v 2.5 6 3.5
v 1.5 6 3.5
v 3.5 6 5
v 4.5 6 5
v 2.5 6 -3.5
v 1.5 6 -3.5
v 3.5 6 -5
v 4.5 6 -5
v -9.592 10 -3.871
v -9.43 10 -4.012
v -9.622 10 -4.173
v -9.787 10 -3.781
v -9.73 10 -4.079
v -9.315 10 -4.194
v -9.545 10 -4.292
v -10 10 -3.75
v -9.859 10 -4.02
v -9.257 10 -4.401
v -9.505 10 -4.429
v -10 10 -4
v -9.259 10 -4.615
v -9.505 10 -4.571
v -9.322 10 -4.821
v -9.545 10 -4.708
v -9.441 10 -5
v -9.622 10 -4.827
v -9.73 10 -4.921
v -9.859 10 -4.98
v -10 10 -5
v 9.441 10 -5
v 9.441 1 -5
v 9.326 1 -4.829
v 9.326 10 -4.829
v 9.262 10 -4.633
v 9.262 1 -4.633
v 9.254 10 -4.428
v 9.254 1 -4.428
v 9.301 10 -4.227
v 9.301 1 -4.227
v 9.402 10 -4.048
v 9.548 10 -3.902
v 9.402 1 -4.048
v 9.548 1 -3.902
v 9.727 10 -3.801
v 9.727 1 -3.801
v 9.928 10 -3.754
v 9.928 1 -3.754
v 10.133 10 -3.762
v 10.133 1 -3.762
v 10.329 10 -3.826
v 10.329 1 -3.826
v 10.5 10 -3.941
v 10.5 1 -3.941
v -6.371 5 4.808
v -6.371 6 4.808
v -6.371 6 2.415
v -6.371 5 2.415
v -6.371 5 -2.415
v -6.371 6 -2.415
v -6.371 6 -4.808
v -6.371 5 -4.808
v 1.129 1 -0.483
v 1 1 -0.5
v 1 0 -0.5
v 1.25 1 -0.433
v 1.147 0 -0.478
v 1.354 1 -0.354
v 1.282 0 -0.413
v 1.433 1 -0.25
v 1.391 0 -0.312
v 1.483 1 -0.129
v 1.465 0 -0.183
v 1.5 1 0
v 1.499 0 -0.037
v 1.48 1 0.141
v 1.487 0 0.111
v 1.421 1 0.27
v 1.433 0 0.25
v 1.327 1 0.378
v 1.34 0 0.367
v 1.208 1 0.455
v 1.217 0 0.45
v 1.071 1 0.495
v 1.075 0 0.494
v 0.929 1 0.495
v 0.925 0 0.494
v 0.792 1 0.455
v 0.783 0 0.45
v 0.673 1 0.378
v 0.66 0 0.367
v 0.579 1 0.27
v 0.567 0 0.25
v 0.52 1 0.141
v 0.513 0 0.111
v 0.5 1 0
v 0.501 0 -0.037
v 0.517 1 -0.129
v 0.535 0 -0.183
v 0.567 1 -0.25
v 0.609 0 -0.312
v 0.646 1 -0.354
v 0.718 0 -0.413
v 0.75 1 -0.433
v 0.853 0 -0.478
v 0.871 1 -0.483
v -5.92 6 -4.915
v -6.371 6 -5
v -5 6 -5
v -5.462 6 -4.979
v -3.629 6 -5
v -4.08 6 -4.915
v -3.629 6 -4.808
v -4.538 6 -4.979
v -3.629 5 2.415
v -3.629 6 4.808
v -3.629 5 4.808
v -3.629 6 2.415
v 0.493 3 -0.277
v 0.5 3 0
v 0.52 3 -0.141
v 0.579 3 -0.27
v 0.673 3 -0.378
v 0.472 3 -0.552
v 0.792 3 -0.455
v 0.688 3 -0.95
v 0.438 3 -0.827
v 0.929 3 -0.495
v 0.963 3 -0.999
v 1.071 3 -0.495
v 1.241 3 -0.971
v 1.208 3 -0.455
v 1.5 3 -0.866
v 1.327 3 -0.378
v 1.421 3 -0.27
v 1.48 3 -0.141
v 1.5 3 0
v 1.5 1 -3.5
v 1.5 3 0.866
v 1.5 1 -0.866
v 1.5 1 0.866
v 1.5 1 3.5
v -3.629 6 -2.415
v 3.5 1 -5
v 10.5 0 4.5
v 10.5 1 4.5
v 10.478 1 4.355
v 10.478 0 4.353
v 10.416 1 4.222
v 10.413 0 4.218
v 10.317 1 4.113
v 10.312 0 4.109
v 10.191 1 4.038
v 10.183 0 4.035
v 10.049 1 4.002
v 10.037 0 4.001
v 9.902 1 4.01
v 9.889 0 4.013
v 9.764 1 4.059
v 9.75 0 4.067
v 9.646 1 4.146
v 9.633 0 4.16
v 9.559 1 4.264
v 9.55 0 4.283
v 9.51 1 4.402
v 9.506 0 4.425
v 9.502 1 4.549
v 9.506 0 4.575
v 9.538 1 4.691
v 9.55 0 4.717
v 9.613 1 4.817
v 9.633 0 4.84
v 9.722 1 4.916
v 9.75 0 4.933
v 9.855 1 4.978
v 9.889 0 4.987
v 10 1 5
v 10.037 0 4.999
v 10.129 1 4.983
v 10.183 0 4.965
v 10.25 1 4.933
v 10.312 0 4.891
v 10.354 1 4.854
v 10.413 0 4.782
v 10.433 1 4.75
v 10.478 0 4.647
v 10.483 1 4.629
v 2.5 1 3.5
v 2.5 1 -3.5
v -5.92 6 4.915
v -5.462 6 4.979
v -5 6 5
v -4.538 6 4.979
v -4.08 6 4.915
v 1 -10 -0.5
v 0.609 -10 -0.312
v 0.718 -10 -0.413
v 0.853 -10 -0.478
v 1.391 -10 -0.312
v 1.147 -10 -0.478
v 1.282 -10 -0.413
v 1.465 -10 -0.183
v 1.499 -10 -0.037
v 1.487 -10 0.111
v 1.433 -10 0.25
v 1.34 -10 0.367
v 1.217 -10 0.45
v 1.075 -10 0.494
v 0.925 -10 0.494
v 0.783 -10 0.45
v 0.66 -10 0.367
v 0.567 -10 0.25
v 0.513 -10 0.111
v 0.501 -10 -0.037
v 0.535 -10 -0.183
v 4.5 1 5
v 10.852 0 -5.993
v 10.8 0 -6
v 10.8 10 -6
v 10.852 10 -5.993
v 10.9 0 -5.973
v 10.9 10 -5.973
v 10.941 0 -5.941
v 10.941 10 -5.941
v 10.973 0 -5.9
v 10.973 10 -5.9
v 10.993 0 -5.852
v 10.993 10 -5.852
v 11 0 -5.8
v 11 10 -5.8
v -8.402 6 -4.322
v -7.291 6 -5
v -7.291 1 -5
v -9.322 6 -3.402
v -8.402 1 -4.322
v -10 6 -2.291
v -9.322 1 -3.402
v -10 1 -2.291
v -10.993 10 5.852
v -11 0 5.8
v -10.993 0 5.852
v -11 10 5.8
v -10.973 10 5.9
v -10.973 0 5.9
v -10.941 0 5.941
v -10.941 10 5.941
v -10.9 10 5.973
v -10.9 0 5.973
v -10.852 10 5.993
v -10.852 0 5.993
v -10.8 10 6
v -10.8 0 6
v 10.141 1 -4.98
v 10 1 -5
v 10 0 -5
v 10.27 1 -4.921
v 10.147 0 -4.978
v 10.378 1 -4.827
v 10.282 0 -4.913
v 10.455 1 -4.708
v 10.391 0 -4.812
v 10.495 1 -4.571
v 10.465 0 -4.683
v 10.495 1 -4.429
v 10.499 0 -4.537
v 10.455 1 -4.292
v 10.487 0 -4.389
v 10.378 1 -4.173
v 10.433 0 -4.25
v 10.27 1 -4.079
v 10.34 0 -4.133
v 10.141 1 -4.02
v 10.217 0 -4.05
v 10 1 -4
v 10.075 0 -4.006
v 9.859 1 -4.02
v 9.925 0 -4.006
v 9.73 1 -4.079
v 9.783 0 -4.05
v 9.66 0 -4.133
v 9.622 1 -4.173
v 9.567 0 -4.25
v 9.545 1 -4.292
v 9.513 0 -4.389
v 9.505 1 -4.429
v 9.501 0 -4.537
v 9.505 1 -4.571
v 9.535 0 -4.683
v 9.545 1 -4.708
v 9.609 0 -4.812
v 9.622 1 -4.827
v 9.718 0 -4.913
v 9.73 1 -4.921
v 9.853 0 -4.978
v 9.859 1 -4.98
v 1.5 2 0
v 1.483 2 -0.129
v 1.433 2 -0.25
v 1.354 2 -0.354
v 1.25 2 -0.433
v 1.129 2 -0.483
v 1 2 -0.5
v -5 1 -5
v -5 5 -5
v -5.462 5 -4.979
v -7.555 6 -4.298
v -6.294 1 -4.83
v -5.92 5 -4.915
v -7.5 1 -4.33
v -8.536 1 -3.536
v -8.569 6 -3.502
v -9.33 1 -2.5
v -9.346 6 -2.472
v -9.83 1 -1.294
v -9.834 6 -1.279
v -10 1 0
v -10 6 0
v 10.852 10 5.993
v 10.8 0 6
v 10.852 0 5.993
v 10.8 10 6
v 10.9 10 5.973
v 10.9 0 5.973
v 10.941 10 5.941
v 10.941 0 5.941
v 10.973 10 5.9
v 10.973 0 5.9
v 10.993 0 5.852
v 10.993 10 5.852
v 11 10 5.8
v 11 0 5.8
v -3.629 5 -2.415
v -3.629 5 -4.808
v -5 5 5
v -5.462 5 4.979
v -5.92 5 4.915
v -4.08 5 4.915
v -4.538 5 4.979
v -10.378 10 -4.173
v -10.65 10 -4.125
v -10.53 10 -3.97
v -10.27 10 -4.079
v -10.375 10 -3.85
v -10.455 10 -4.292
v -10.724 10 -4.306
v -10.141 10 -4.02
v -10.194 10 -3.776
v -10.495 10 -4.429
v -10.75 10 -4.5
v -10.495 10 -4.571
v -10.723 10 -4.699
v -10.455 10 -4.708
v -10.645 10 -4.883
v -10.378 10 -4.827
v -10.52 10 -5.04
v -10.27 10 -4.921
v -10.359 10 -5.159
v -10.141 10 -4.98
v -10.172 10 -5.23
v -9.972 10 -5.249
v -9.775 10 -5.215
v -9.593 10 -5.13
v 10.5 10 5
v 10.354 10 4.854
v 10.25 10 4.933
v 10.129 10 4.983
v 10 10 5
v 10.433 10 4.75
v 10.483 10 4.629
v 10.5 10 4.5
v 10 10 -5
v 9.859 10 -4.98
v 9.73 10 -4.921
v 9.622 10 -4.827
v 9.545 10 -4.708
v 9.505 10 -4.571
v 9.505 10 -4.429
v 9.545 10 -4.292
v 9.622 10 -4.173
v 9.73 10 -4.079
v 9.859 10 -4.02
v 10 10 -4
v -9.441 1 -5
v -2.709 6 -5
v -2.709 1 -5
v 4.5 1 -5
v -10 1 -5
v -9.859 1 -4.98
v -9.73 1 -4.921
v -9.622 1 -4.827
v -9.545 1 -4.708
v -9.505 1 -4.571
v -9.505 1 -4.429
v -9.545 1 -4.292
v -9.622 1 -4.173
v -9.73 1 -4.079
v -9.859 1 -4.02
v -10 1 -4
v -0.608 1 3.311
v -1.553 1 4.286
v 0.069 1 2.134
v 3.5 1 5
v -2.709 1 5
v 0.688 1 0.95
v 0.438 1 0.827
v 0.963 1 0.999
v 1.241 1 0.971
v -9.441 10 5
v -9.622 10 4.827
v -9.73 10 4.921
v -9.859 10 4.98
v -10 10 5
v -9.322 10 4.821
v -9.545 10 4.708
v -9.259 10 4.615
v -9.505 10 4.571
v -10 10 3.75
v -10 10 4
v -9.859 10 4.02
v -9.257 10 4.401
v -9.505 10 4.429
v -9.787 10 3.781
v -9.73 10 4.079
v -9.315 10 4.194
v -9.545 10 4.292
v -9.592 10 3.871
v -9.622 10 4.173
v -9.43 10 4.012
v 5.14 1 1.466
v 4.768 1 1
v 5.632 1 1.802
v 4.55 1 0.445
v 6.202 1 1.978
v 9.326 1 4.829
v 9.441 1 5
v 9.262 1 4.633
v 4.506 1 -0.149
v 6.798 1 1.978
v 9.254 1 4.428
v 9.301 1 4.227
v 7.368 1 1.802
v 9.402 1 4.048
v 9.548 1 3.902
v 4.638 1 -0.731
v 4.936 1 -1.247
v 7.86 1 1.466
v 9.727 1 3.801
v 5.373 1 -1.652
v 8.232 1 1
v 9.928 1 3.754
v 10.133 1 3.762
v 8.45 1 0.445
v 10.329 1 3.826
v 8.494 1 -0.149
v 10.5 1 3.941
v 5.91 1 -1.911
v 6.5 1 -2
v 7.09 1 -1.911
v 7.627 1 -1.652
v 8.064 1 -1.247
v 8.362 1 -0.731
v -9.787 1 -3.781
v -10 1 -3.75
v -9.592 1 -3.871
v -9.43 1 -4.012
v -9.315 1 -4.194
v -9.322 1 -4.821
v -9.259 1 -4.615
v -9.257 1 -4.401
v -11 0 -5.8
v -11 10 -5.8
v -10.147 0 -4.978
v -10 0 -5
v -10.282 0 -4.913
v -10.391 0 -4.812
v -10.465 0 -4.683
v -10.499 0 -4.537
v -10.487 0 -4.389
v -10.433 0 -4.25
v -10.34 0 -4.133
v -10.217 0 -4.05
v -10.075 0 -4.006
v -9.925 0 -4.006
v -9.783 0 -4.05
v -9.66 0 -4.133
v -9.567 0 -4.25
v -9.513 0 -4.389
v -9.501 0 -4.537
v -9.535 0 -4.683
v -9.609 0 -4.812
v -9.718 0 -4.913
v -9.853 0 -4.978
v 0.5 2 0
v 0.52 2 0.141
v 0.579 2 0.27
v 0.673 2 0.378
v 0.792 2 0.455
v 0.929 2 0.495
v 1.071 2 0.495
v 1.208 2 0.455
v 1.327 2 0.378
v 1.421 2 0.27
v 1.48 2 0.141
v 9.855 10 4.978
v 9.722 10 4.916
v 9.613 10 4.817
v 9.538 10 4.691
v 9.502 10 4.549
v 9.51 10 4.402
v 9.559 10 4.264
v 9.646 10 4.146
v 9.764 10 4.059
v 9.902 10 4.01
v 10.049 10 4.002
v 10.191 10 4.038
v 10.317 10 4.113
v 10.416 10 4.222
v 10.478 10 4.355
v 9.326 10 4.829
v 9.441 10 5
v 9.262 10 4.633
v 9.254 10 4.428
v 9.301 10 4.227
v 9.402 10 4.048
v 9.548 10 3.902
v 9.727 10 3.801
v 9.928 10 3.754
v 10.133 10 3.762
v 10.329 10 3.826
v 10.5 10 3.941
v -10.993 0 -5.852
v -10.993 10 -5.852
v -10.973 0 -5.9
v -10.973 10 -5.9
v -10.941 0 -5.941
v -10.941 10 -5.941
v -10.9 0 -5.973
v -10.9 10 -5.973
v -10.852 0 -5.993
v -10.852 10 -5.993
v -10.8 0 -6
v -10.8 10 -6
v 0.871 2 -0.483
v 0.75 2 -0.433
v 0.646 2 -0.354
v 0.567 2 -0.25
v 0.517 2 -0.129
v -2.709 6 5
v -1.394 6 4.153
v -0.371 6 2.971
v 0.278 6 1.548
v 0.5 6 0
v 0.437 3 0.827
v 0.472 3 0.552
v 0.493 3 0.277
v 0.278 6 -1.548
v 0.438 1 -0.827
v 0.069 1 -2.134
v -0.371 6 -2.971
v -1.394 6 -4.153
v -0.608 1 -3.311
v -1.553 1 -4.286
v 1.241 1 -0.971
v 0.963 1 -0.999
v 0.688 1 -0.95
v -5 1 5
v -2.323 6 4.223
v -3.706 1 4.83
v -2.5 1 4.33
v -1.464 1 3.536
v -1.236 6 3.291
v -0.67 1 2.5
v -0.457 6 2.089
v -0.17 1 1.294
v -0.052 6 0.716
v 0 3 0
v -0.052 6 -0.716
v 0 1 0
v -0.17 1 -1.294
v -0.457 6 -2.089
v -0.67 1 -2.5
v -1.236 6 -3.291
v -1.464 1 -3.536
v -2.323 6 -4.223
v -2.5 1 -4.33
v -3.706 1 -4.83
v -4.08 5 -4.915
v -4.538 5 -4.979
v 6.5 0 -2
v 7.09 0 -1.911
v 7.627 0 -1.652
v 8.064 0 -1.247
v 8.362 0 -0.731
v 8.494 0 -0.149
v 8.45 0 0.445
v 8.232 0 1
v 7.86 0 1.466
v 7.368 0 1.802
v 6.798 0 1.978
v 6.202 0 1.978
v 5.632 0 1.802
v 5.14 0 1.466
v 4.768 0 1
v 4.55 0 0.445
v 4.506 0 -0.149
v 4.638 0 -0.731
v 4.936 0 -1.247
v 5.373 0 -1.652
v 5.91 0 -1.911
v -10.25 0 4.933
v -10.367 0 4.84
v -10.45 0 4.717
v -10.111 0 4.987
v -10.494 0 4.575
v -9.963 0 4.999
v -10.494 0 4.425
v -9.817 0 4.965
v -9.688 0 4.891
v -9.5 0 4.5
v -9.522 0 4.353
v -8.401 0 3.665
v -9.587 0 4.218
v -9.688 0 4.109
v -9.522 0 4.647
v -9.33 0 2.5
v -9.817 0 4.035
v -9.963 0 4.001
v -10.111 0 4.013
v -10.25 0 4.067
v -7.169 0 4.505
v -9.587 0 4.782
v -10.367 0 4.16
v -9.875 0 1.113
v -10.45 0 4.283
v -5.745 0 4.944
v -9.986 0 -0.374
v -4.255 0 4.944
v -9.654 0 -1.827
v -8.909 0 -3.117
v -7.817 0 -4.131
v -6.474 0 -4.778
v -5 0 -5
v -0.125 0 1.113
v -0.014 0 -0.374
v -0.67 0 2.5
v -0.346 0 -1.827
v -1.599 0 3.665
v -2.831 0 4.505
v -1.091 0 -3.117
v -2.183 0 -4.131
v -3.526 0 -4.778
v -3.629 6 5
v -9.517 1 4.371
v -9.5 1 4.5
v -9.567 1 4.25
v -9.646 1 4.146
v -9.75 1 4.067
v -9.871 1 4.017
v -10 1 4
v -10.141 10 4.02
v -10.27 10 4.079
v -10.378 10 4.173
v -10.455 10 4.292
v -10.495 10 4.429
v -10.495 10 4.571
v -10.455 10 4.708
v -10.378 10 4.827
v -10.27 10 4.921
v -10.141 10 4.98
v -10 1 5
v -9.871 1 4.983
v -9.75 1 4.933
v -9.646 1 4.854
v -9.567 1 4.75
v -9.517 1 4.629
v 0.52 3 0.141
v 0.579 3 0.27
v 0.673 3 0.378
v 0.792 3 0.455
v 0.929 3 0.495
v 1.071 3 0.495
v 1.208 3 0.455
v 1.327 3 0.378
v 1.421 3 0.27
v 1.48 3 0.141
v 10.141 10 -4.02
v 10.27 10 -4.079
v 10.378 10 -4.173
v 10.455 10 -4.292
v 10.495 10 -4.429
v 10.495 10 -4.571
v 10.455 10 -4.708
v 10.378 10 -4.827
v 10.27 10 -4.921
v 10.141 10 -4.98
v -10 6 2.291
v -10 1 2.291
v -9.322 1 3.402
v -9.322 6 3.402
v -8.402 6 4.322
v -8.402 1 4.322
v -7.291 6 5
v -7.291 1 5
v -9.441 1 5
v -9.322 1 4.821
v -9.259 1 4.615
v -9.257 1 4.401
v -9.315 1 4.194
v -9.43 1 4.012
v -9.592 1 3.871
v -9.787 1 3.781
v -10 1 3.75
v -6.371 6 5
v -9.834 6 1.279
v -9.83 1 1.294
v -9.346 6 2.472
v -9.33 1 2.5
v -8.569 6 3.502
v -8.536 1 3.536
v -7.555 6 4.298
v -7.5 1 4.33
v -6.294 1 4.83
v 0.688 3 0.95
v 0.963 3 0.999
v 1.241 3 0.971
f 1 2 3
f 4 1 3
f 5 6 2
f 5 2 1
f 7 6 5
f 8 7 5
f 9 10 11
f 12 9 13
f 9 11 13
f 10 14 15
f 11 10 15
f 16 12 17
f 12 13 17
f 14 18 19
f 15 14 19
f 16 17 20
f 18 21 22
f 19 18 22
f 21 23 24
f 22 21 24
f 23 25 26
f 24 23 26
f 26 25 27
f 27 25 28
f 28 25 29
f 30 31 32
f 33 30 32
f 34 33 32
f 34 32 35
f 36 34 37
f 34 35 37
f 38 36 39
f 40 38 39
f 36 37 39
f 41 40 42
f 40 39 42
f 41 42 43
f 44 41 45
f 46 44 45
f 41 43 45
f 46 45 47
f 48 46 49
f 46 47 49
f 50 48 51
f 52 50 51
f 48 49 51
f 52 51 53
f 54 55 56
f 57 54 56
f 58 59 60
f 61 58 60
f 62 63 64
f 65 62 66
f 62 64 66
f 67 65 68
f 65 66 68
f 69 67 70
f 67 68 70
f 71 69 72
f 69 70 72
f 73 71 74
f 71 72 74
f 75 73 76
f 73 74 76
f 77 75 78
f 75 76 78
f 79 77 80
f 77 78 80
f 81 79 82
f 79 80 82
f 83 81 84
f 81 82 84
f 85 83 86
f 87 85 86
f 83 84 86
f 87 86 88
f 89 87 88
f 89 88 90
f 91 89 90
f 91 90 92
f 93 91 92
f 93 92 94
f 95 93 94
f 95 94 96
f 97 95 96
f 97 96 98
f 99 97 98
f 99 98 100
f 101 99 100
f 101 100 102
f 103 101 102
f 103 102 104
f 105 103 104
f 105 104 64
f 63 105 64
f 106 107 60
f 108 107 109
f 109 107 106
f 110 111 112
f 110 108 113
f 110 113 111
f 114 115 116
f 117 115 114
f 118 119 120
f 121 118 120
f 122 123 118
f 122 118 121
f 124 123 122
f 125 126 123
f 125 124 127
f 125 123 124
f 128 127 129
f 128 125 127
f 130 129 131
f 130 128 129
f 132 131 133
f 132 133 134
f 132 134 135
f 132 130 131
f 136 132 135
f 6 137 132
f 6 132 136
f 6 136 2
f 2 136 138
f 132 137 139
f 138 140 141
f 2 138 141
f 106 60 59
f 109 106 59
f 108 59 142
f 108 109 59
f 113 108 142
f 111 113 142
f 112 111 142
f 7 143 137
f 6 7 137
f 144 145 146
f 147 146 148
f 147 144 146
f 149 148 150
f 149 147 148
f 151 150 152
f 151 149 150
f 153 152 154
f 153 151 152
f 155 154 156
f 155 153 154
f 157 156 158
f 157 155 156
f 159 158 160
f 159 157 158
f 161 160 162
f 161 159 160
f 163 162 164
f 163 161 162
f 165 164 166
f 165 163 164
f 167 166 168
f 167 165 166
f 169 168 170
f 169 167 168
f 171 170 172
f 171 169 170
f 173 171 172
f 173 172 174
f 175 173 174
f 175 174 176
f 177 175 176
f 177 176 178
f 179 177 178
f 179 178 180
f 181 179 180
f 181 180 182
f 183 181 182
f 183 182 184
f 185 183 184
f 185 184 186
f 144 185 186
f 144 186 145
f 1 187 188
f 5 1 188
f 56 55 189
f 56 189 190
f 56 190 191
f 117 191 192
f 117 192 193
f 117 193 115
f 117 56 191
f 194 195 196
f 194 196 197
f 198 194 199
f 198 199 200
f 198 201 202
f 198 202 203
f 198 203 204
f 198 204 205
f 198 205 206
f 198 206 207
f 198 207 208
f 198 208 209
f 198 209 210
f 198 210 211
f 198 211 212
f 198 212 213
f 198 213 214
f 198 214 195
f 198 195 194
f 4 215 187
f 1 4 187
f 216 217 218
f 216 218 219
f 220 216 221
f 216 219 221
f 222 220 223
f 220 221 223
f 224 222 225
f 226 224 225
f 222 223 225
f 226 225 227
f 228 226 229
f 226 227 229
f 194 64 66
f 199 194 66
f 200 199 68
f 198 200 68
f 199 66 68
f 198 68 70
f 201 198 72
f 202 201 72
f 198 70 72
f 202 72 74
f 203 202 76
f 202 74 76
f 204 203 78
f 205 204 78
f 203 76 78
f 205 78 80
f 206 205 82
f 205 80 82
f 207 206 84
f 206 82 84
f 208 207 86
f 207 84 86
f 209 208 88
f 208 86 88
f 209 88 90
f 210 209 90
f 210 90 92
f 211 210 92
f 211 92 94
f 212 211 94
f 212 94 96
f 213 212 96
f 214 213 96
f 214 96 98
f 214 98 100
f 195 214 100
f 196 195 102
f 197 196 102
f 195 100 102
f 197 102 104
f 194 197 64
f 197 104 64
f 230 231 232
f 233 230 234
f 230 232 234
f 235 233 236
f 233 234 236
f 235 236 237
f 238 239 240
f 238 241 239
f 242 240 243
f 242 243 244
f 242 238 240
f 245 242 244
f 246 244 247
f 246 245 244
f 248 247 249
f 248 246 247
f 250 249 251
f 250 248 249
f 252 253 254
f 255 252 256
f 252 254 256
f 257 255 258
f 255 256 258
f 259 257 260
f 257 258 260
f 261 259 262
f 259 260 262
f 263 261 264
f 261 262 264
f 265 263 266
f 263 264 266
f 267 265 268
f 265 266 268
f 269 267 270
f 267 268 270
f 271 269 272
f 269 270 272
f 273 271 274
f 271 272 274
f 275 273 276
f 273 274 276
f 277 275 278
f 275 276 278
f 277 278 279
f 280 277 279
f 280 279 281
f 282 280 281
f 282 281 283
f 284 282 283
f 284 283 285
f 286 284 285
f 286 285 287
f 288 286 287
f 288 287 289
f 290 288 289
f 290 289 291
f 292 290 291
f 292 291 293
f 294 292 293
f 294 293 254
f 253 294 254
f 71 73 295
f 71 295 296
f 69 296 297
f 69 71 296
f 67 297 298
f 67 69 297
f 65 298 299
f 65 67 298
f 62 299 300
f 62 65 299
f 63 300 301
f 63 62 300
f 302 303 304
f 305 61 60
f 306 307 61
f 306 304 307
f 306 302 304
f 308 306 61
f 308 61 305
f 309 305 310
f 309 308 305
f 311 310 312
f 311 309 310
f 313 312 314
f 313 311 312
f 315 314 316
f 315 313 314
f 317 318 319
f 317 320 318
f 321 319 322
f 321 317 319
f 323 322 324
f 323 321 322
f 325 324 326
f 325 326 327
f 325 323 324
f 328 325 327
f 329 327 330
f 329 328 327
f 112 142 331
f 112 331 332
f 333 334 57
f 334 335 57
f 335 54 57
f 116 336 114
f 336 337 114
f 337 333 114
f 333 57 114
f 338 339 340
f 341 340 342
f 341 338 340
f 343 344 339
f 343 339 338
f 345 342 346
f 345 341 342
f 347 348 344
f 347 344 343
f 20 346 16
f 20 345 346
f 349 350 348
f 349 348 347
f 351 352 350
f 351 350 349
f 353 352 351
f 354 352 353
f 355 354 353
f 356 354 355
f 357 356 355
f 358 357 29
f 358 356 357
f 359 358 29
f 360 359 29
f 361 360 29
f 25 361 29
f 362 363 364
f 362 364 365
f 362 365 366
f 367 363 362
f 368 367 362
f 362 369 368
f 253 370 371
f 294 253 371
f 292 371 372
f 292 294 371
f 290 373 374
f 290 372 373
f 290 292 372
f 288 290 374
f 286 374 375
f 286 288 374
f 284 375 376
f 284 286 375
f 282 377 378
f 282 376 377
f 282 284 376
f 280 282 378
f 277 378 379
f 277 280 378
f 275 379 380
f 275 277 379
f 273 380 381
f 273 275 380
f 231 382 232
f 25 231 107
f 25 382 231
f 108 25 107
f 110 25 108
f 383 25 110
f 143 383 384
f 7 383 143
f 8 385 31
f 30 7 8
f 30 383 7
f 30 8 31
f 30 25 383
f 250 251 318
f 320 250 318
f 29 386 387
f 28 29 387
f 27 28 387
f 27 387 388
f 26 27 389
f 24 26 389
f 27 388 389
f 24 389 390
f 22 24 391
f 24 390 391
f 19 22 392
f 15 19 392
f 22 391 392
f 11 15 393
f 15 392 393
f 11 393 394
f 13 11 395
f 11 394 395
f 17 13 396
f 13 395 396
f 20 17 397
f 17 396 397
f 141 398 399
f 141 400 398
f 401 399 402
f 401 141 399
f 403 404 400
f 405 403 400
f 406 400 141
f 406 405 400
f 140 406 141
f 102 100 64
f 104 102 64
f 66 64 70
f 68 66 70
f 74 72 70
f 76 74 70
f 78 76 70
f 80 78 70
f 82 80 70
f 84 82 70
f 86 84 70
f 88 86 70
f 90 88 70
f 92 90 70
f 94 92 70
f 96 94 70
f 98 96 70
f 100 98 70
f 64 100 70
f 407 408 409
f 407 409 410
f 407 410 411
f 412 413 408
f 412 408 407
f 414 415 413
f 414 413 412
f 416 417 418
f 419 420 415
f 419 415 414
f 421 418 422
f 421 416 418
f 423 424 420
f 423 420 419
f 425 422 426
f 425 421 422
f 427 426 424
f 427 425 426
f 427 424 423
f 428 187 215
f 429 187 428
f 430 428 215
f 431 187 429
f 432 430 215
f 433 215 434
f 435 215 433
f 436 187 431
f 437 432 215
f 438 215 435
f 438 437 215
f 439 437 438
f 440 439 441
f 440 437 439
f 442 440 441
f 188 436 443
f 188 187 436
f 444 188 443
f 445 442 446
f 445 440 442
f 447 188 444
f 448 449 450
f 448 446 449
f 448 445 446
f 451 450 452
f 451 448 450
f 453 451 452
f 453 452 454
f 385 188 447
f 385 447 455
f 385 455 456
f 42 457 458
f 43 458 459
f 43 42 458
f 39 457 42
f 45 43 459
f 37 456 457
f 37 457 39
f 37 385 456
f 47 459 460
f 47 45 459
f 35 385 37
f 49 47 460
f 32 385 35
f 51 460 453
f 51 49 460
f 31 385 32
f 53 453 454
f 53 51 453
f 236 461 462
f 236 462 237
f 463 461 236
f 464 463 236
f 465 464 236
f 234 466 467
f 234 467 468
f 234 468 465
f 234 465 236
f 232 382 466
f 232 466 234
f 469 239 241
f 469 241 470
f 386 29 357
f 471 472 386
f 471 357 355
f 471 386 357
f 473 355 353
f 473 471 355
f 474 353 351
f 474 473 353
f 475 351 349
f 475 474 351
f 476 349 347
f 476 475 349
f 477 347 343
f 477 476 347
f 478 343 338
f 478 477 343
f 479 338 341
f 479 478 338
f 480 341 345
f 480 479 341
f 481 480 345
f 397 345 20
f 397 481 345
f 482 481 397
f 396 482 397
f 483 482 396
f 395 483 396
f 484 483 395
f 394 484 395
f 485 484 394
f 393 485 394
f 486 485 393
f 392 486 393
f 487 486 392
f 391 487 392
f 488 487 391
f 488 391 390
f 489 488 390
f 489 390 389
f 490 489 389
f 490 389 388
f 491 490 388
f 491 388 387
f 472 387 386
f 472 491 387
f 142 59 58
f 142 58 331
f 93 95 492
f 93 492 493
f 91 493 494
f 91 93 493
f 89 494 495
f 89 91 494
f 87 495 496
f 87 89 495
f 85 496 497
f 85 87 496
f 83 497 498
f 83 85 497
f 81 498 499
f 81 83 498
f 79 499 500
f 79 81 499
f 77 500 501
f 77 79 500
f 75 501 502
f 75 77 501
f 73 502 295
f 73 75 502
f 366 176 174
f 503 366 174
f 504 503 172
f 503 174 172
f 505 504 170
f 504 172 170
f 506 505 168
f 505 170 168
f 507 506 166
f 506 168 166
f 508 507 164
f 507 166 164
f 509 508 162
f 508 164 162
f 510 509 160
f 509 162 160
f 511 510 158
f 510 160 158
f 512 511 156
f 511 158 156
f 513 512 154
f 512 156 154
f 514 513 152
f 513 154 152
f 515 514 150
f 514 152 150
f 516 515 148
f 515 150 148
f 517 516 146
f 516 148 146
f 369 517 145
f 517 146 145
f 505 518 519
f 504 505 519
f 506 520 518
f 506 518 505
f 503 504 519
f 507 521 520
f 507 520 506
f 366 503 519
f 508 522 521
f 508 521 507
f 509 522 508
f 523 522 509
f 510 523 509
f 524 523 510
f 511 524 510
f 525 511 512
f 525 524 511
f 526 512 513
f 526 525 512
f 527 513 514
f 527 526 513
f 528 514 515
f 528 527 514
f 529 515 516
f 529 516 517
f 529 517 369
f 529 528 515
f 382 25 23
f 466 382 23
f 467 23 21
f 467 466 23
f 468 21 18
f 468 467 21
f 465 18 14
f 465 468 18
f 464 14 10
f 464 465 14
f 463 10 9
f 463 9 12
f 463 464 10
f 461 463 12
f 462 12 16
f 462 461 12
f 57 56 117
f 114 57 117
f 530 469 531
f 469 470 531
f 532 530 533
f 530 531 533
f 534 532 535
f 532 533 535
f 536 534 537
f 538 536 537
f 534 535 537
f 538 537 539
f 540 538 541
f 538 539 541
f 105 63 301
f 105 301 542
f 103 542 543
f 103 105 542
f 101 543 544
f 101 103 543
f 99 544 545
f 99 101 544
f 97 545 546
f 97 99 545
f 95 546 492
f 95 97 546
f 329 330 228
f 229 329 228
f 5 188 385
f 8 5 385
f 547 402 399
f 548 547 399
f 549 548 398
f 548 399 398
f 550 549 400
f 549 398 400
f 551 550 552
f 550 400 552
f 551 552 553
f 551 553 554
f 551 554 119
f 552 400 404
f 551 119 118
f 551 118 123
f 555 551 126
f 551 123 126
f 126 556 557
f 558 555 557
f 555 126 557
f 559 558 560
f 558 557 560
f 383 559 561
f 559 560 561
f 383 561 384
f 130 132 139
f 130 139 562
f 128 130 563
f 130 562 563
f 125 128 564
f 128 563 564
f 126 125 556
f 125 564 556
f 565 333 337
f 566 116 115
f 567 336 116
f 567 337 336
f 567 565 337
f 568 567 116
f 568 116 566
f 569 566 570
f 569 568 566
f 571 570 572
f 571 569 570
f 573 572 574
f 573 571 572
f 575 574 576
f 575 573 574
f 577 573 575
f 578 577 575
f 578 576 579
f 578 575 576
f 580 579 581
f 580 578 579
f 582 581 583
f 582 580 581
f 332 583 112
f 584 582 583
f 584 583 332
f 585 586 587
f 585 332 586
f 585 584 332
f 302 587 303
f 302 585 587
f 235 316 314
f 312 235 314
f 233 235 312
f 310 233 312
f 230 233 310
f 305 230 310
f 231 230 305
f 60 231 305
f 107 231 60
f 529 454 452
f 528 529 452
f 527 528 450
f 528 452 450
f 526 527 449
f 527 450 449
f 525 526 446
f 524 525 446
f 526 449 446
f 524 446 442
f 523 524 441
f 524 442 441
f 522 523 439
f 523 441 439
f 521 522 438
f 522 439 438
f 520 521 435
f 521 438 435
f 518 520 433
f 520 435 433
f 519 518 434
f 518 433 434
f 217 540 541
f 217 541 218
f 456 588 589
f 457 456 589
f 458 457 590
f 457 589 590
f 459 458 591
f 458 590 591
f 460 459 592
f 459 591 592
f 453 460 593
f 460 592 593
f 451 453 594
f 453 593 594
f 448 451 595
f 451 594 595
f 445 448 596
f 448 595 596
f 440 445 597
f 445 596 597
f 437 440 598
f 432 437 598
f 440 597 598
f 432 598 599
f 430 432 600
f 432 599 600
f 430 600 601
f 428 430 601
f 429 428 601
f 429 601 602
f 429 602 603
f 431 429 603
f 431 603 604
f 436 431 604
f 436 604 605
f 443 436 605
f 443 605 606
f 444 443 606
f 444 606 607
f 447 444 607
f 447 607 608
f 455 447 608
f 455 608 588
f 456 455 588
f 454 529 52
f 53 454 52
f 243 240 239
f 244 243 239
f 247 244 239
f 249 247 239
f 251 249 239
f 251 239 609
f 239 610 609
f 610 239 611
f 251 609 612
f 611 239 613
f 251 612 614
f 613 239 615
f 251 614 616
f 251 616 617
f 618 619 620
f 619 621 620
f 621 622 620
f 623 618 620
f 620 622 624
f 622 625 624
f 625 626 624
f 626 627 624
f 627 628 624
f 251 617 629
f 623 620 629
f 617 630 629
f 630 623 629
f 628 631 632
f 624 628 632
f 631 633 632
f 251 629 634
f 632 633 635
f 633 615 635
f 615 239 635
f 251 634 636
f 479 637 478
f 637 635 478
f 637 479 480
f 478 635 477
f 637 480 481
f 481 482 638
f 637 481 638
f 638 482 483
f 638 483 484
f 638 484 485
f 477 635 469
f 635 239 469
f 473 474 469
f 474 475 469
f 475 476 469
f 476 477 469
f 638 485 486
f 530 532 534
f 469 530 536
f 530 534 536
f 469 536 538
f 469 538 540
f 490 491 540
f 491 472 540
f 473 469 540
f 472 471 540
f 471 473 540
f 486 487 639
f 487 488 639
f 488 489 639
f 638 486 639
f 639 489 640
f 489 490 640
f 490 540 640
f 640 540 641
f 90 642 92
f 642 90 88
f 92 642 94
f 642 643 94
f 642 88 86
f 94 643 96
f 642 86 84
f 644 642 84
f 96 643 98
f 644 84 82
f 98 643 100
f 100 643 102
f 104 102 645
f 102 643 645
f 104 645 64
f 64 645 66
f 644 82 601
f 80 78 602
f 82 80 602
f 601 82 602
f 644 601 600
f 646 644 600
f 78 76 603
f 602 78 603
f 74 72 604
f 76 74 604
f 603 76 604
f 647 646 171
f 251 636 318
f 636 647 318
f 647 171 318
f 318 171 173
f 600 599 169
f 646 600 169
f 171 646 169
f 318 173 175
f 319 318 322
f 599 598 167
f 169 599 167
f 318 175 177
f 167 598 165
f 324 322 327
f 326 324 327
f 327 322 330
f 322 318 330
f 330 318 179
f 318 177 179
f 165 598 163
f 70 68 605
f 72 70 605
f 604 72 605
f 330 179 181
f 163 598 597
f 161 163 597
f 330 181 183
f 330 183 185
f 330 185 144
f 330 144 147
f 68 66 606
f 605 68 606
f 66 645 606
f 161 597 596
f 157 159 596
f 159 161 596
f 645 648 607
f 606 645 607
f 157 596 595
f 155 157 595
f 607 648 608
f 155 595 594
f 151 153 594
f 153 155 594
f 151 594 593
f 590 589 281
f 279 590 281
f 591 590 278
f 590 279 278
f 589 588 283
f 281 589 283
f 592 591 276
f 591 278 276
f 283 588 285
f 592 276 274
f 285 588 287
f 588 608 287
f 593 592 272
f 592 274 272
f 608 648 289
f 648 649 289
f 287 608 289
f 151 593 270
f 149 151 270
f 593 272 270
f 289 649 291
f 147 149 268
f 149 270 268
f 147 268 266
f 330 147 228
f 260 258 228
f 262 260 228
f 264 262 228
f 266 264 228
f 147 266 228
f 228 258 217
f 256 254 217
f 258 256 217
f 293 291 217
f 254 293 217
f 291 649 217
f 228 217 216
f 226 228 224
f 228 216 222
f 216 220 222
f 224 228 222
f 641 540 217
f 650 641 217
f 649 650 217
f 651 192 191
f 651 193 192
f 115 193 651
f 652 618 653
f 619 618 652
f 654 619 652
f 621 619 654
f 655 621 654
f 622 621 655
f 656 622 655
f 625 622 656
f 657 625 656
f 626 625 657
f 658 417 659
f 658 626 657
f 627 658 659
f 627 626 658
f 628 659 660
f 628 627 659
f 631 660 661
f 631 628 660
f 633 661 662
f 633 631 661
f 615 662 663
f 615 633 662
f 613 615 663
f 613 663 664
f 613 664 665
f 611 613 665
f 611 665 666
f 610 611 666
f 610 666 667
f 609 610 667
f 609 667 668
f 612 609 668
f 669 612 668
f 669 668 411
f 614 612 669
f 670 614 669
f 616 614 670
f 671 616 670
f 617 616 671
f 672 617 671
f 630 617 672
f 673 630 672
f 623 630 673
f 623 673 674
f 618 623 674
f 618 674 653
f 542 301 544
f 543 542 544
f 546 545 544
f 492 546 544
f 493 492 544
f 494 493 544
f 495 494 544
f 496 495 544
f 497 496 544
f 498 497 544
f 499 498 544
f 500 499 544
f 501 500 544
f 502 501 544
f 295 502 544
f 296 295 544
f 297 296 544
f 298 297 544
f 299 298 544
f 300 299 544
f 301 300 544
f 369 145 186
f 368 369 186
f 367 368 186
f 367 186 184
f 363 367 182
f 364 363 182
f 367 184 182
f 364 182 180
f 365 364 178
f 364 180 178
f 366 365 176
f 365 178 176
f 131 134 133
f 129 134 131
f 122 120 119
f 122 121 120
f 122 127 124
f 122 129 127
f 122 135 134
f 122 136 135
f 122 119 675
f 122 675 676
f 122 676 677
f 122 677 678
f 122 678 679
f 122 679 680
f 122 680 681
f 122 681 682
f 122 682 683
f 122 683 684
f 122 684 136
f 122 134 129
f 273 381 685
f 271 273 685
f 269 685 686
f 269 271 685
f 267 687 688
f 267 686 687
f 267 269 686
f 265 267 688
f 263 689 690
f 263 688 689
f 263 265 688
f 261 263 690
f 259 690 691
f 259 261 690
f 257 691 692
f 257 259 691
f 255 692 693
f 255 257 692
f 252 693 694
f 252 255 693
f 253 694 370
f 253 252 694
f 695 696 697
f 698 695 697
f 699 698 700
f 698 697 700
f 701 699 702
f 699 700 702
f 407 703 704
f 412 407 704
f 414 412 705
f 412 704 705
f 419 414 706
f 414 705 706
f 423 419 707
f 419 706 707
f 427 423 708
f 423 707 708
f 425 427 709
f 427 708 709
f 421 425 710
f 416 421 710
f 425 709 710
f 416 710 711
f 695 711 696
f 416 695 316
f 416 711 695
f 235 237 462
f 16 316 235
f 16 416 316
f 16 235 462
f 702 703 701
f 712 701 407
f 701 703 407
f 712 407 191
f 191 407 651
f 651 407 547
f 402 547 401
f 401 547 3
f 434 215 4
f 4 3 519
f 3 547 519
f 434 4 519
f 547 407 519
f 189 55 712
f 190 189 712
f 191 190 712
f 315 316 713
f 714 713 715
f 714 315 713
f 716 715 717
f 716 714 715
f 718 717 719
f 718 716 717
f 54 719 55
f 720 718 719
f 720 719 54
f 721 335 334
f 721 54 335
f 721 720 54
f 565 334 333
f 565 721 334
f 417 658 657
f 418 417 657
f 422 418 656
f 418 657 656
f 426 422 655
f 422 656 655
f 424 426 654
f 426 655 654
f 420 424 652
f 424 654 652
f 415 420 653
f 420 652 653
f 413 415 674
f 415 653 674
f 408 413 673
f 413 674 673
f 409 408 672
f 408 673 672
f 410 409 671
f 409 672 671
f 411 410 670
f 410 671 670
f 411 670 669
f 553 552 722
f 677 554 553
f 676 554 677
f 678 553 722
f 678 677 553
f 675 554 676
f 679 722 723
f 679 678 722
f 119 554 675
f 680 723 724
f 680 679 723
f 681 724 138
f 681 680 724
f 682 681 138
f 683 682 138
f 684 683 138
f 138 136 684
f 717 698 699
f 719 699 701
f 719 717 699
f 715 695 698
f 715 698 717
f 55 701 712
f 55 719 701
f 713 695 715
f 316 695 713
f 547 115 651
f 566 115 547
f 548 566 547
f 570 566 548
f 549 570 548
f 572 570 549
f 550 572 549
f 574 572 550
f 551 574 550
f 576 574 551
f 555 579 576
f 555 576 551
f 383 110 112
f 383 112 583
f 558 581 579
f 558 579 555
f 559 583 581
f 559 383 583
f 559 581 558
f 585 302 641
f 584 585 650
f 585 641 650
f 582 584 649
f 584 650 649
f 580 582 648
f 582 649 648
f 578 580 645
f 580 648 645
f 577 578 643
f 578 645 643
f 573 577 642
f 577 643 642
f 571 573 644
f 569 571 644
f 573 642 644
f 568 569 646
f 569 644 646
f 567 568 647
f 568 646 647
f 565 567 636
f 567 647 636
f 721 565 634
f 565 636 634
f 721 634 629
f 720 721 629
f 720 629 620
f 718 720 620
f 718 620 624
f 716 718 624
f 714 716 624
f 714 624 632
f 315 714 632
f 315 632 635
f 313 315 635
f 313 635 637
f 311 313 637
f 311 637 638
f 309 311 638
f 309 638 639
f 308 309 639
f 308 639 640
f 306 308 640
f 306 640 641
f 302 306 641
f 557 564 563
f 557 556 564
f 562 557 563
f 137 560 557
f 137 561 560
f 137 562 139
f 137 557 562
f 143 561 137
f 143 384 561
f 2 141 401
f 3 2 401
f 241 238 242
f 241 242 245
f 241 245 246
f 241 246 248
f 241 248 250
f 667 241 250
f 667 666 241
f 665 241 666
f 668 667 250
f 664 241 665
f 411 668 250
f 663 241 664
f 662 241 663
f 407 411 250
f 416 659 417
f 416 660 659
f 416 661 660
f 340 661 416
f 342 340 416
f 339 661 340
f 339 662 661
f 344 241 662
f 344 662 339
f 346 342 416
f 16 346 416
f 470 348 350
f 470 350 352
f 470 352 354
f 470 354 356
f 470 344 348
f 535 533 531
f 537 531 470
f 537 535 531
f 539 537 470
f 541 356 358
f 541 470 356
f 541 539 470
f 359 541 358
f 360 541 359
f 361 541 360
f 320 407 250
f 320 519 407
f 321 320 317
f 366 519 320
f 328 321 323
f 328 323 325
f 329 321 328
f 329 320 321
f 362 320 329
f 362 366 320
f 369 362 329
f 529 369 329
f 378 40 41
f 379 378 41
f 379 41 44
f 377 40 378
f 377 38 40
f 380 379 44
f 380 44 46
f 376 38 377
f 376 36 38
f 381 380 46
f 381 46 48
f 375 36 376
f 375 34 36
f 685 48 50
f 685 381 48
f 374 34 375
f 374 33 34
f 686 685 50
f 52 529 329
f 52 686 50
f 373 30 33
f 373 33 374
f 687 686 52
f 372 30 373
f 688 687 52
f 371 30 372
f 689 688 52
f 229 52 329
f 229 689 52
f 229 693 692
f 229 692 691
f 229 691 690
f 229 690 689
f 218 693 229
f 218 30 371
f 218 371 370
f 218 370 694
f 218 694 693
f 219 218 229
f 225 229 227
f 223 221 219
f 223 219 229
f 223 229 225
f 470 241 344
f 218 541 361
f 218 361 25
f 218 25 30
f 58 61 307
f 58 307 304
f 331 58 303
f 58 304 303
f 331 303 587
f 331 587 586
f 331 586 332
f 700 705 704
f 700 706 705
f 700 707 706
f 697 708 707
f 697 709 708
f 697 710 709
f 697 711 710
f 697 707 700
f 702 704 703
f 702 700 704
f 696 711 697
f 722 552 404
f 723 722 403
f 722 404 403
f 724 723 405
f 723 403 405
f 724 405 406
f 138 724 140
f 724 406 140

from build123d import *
from build123d.topology import SkipClean

# Parameters (mm, degrees)
SKETCH1_W                 = 22
SKETCH1_H                 = 12
BOSS_EXTRUDE1_DEPTH       = 10
SKETCH2_W                 = 20.5
SKETCH2_H                 = 10
CUT_EXTRUDE1_DEPTH        = 9
FILLET1_R                 = 0.2
SKETCH3_R                 = 5
CUT_EXTRUDE2_DEPTH        = 17.031219542
SKETCH4_R                 = 0.5
CUT_EXTRUDE3_DEPTH        = 17.031219542
SKETCH5_R                 = 2
CUT_EXTRUDE4_DEPTH        = 17.031219542
BOSS_EXTRUDE2_DEPTH       = 5
SKETCH9_R                 = 5.5
SKETCH9_R_2               = 5
BOSS_EXTRUDE3_DEPTH       = 5
SKETCH10_R                = 1
SKETCH10_R_2              = 0.5
BOSS_EXTRUDE4_DEPTH       = 2
BOSS_EXTRUDE6_START       = -1
SKETCH12_R                = 0.5
BOSS_EXTRUDE6_DEPTH       = 1
SKETCH13_R                = 0.75
SKETCH13_R_2              = 0.5
BOSS_EXTRUDE7_DEPTH       = 9
SKETCH14_R                = 0.5
CUT_EXTRUDE5_DEPTH        = 17.031219542
MIRROR2_COPY_1_SKETCH_R   = 0.75
MIRROR2_COPY_1_SKETCH_R_2 = 0.5
MIRROR2_COPY_1_DEPTH      = 9
MIRROR2_COPY_2_SKETCH_R   = 0.5
MIRROR2_COPY_2_DEPTH      = 17.031219542
MIRROR2_COPY_3_SKETCH_R   = 0.75
MIRROR2_COPY_3_SKETCH_R_2 = 0.5
MIRROR2_COPY_3_DEPTH      = 9
MIRROR2_COPY_4_SKETCH_R   = 0.5
MIRROR2_COPY_4_DEPTH      = 17.031219542
SKETCH15_W                = 2.741193842
SKETCH15_H                = 3.121519946
BOSS_EXTRUDE8_DEPTH       = 1
SKETCH16_R                = 0.5
BOSS_EXTRUDE9_DEPTH       = 10


with BuildPart() as part:
    # Sketch1 → Boss-Extrude1 (new body)
    with BuildSketch(Plane(origin=(0, 0, 0), x_dir=(1, 0, 0), z_dir=(0, 1, 0))):
        Rectangle(SKETCH1_W, SKETCH1_H)
    extrude(amount=BOSS_EXTRUDE1_DEPTH)

    # Sketch2 → Cut-Extrude1 (cut)
    with BuildSketch(Plane(origin=(0, 10, 0), x_dir=(1, 0, 0), z_dir=(0, 1, 0))):
        with Locations((0.25, 0)):
            Rectangle(SKETCH2_W, SKETCH2_H)
    extrude(amount=-CUT_EXTRUDE1_DEPTH, mode=Mode.SUBTRACT)

    # Fillet1
    fillet1_edges = [part.edges().sort_by_distance(p)[0] for p in [
        (-11, 5, -6),
        (11, 5, -6),
        (11, 5, 6),
        (-11, 5, 6),
    ]]
    fillet(fillet1_edges, radius=FILLET1_R)

    # Sketch3 → Cut-Extrude2 (cut, through all)
    with BuildSketch(Plane(origin=(0, 0, 0), x_dir=(-1, 0, 0), z_dir=(0, -1, 0))):
        with Locations((5, 0)):
            Circle(SKETCH3_R)
    extrude(amount=-CUT_EXTRUDE2_DEPTH, mode=Mode.SUBTRACT)

    # Sketch4 → Cut-Extrude3 (cut, through all)
    with BuildSketch(Plane(origin=(0, 0, 0), x_dir=(-1, 0, 0), z_dir=(0, -1, 0))):
        with Locations((-1, 0)):
            Circle(SKETCH4_R)
    extrude(amount=-CUT_EXTRUDE3_DEPTH, mode=Mode.SUBTRACT)

    # Sketch5 → Cut-Extrude4 (cut, through all)
    with BuildSketch(Plane(origin=(0, 0, 0), x_dir=(-1, 0, 0), z_dir=(0, -1, 0))):
        with Locations((-6.5, 0)):
            Circle(SKETCH5_R)
    extrude(amount=-CUT_EXTRUDE4_DEPTH, mode=Mode.SUBTRACT)

    # Sketch6 → Boss-Extrude2 (add)
    with BuildSketch(Plane(origin=(0, 1, 0), x_dir=(1, 0, 0), z_dir=(0, 1, 0))):
        Polygon((2.5, -3.5), (2.5, 3.5), (4.5, 5), (3.5, 5), (1.5, 3.5), (1.5, -3.5), (3.5, -5), (4.5, -5), align=None)
    extrude(amount=BOSS_EXTRUDE2_DEPTH)

    # Sketch9 → Boss-Extrude3 (add)
    with SkipClean():  # the faces are left unmerged after this step: merging them gives an invalid solid
        with BuildSketch(Plane(origin=(0, 1, 0), x_dir=(1, 0, 0), z_dir=(0, 1, 0))):
            with Locations((-5, 0)):
                Circle(SKETCH9_R)
            with Locations((-5, 0)):
                Circle(SKETCH9_R_2, mode=Mode.SUBTRACT)
        extrude(amount=BOSS_EXTRUDE3_DEPTH)

    # Sketch10 → Boss-Extrude4 (add)
    with SkipClean():  # the faces are left unmerged after this step: merging them gives an invalid solid
        with BuildSketch(Plane(origin=(0, 1, 0), x_dir=(1, 0, 0), z_dir=(0, 1, 0))):
            with Locations((1, 0)):
                Circle(SKETCH10_R)
            with Locations((1, 0)):
                Circle(SKETCH10_R_2, mode=Mode.SUBTRACT)
        extrude(amount=BOSS_EXTRUDE4_DEPTH)

    # Sketch12 → Boss-Extrude6 (add)
    with SkipClean():  # the faces are left unmerged after this step: merging them gives an invalid solid
        with BuildSketch(Plane(origin=(0, 3, 0), x_dir=(1, 0, 0), z_dir=(0, 1, 0)).offset(BOSS_EXTRUDE6_START)):
            with Locations((1, 0)):
                Circle(SKETCH12_R)
        extrude(amount=BOSS_EXTRUDE6_DEPTH)

    # Sketch13 → Boss-Extrude7 (add)
    with SkipClean():  # the faces are left unmerged after this step: merging them gives an invalid solid
        with BuildSketch(Plane(origin=(0, 1, 0), x_dir=(1, 0, 0), z_dir=(0, 1, 0))):
            with Locations((10, 4.5)):
                Circle(SKETCH13_R)
            with Locations((10, 4.5)):
                Circle(SKETCH13_R_2, mode=Mode.SUBTRACT)
        boss_extrude7 = extrude(amount=BOSS_EXTRUDE7_DEPTH)

    # Sketch14 → Cut-Extrude5 (cut, through all)
    with SkipClean():  # the faces are left unmerged after this step: merging them gives an invalid solid
        with BuildSketch(Plane(origin=(0, 0, 0), x_dir=(-1, 0, 0), z_dir=(0, -1, 0))):
            with Locations((-10, 4.5)):
                Circle(SKETCH14_R)
        cut_extrude5 = extrude(amount=-CUT_EXTRUDE5_DEPTH, mode=Mode.SUBTRACT)

    # Mirror1: Boss-Extrude7, Cut-Extrude5 across plane
    with SkipClean():  # the faces are left unmerged after this step: merging them gives an invalid solid
        add(boss_extrude7.mirror(Plane(origin=(0, 0, 0), x_dir=(0, 0, 1), z_dir=(1, 0, 0))))
        add(cut_extrude5.mirror(Plane(origin=(0, 0, 0), x_dir=(0, 0, 1), z_dir=(1, 0, 0))), mode=Mode.SUBTRACT)

    # Mirror2 copy 1 sketch → Mirror2 copy 1 (add)
    with SkipClean():  # the faces are left unmerged after this step: merging them gives an invalid solid
        with BuildSketch(Plane(origin=(0, 1, 0), x_dir=(-1, 0, 0), z_dir=(0, 1, 0))):
            with Locations((10, 4.5)):
                Circle(MIRROR2_COPY_1_SKETCH_R)
            with Locations((10, 4.5)):
                Circle(MIRROR2_COPY_1_SKETCH_R_2, mode=Mode.SUBTRACT)
        extrude(amount=MIRROR2_COPY_1_DEPTH)

    # Mirror2 copy 2 sketch → Mirror2 copy 2 (cut, through all)
    with SkipClean():  # the faces are left unmerged after this step: merging them gives an invalid solid
        with BuildSketch(Plane.XZ):
            with Locations((-10, 4.5)):
                Circle(MIRROR2_COPY_2_SKETCH_R)
        extrude(amount=-MIRROR2_COPY_2_DEPTH, mode=Mode.SUBTRACT)

    # Mirror2 copy 3 sketch → Mirror2 copy 3 (add)
    with SkipClean():  # the faces are left unmerged after this step: merging them gives an invalid solid
        with BuildSketch(Plane(origin=(0, 1, 0), x_dir=(1, 0, 0), z_dir=(0, 1, 0))):
            with Locations((10, -4.5)):
                Circle(MIRROR2_COPY_3_SKETCH_R)
            with Locations((10, -4.5)):
                Circle(MIRROR2_COPY_3_SKETCH_R_2, mode=Mode.SUBTRACT)
        extrude(amount=MIRROR2_COPY_3_DEPTH)

    # Mirror2 copy 4 sketch → Mirror2 copy 4 (cut, through all)
    with SkipClean():  # the faces are left unmerged after this step: merging them gives an invalid solid
        with BuildSketch(Plane(origin=(0, 0, 0), x_dir=(-1, 0, 0), z_dir=(0, -1, 0))):
            with Locations((-10, -4.5)):
                Circle(MIRROR2_COPY_4_SKETCH_R)
        extrude(amount=-MIRROR2_COPY_4_DEPTH, mode=Mode.SUBTRACT)

    # Sketch15 → Boss-Extrude8 (add)
    with SkipClean():  # the faces are left unmerged after this step: merging them gives an invalid solid
        with BuildSketch(Plane(origin=(0, 6, 0), x_dir=(1, 0, 0), z_dir=(0, 1, 0))):
            with Locations((-5, 3.975545746)):
                Rectangle(SKETCH15_W, SKETCH15_H)
            with Locations((-5, -3.975545746)):
                Rectangle(SKETCH15_W, SKETCH15_H)
        extrude(amount=-BOSS_EXTRUDE8_DEPTH)


with BuildPart() as body_2:
    # Sketch16 → Boss-Extrude9 (new body)
    with BuildSketch(Plane.XZ):
        with Locations((1, 0)):
            Circle(SKETCH16_R)
    extrude(amount=BOSS_EXTRUDE9_DEPTH)


solid = Compound([part.part, body_2.part])
